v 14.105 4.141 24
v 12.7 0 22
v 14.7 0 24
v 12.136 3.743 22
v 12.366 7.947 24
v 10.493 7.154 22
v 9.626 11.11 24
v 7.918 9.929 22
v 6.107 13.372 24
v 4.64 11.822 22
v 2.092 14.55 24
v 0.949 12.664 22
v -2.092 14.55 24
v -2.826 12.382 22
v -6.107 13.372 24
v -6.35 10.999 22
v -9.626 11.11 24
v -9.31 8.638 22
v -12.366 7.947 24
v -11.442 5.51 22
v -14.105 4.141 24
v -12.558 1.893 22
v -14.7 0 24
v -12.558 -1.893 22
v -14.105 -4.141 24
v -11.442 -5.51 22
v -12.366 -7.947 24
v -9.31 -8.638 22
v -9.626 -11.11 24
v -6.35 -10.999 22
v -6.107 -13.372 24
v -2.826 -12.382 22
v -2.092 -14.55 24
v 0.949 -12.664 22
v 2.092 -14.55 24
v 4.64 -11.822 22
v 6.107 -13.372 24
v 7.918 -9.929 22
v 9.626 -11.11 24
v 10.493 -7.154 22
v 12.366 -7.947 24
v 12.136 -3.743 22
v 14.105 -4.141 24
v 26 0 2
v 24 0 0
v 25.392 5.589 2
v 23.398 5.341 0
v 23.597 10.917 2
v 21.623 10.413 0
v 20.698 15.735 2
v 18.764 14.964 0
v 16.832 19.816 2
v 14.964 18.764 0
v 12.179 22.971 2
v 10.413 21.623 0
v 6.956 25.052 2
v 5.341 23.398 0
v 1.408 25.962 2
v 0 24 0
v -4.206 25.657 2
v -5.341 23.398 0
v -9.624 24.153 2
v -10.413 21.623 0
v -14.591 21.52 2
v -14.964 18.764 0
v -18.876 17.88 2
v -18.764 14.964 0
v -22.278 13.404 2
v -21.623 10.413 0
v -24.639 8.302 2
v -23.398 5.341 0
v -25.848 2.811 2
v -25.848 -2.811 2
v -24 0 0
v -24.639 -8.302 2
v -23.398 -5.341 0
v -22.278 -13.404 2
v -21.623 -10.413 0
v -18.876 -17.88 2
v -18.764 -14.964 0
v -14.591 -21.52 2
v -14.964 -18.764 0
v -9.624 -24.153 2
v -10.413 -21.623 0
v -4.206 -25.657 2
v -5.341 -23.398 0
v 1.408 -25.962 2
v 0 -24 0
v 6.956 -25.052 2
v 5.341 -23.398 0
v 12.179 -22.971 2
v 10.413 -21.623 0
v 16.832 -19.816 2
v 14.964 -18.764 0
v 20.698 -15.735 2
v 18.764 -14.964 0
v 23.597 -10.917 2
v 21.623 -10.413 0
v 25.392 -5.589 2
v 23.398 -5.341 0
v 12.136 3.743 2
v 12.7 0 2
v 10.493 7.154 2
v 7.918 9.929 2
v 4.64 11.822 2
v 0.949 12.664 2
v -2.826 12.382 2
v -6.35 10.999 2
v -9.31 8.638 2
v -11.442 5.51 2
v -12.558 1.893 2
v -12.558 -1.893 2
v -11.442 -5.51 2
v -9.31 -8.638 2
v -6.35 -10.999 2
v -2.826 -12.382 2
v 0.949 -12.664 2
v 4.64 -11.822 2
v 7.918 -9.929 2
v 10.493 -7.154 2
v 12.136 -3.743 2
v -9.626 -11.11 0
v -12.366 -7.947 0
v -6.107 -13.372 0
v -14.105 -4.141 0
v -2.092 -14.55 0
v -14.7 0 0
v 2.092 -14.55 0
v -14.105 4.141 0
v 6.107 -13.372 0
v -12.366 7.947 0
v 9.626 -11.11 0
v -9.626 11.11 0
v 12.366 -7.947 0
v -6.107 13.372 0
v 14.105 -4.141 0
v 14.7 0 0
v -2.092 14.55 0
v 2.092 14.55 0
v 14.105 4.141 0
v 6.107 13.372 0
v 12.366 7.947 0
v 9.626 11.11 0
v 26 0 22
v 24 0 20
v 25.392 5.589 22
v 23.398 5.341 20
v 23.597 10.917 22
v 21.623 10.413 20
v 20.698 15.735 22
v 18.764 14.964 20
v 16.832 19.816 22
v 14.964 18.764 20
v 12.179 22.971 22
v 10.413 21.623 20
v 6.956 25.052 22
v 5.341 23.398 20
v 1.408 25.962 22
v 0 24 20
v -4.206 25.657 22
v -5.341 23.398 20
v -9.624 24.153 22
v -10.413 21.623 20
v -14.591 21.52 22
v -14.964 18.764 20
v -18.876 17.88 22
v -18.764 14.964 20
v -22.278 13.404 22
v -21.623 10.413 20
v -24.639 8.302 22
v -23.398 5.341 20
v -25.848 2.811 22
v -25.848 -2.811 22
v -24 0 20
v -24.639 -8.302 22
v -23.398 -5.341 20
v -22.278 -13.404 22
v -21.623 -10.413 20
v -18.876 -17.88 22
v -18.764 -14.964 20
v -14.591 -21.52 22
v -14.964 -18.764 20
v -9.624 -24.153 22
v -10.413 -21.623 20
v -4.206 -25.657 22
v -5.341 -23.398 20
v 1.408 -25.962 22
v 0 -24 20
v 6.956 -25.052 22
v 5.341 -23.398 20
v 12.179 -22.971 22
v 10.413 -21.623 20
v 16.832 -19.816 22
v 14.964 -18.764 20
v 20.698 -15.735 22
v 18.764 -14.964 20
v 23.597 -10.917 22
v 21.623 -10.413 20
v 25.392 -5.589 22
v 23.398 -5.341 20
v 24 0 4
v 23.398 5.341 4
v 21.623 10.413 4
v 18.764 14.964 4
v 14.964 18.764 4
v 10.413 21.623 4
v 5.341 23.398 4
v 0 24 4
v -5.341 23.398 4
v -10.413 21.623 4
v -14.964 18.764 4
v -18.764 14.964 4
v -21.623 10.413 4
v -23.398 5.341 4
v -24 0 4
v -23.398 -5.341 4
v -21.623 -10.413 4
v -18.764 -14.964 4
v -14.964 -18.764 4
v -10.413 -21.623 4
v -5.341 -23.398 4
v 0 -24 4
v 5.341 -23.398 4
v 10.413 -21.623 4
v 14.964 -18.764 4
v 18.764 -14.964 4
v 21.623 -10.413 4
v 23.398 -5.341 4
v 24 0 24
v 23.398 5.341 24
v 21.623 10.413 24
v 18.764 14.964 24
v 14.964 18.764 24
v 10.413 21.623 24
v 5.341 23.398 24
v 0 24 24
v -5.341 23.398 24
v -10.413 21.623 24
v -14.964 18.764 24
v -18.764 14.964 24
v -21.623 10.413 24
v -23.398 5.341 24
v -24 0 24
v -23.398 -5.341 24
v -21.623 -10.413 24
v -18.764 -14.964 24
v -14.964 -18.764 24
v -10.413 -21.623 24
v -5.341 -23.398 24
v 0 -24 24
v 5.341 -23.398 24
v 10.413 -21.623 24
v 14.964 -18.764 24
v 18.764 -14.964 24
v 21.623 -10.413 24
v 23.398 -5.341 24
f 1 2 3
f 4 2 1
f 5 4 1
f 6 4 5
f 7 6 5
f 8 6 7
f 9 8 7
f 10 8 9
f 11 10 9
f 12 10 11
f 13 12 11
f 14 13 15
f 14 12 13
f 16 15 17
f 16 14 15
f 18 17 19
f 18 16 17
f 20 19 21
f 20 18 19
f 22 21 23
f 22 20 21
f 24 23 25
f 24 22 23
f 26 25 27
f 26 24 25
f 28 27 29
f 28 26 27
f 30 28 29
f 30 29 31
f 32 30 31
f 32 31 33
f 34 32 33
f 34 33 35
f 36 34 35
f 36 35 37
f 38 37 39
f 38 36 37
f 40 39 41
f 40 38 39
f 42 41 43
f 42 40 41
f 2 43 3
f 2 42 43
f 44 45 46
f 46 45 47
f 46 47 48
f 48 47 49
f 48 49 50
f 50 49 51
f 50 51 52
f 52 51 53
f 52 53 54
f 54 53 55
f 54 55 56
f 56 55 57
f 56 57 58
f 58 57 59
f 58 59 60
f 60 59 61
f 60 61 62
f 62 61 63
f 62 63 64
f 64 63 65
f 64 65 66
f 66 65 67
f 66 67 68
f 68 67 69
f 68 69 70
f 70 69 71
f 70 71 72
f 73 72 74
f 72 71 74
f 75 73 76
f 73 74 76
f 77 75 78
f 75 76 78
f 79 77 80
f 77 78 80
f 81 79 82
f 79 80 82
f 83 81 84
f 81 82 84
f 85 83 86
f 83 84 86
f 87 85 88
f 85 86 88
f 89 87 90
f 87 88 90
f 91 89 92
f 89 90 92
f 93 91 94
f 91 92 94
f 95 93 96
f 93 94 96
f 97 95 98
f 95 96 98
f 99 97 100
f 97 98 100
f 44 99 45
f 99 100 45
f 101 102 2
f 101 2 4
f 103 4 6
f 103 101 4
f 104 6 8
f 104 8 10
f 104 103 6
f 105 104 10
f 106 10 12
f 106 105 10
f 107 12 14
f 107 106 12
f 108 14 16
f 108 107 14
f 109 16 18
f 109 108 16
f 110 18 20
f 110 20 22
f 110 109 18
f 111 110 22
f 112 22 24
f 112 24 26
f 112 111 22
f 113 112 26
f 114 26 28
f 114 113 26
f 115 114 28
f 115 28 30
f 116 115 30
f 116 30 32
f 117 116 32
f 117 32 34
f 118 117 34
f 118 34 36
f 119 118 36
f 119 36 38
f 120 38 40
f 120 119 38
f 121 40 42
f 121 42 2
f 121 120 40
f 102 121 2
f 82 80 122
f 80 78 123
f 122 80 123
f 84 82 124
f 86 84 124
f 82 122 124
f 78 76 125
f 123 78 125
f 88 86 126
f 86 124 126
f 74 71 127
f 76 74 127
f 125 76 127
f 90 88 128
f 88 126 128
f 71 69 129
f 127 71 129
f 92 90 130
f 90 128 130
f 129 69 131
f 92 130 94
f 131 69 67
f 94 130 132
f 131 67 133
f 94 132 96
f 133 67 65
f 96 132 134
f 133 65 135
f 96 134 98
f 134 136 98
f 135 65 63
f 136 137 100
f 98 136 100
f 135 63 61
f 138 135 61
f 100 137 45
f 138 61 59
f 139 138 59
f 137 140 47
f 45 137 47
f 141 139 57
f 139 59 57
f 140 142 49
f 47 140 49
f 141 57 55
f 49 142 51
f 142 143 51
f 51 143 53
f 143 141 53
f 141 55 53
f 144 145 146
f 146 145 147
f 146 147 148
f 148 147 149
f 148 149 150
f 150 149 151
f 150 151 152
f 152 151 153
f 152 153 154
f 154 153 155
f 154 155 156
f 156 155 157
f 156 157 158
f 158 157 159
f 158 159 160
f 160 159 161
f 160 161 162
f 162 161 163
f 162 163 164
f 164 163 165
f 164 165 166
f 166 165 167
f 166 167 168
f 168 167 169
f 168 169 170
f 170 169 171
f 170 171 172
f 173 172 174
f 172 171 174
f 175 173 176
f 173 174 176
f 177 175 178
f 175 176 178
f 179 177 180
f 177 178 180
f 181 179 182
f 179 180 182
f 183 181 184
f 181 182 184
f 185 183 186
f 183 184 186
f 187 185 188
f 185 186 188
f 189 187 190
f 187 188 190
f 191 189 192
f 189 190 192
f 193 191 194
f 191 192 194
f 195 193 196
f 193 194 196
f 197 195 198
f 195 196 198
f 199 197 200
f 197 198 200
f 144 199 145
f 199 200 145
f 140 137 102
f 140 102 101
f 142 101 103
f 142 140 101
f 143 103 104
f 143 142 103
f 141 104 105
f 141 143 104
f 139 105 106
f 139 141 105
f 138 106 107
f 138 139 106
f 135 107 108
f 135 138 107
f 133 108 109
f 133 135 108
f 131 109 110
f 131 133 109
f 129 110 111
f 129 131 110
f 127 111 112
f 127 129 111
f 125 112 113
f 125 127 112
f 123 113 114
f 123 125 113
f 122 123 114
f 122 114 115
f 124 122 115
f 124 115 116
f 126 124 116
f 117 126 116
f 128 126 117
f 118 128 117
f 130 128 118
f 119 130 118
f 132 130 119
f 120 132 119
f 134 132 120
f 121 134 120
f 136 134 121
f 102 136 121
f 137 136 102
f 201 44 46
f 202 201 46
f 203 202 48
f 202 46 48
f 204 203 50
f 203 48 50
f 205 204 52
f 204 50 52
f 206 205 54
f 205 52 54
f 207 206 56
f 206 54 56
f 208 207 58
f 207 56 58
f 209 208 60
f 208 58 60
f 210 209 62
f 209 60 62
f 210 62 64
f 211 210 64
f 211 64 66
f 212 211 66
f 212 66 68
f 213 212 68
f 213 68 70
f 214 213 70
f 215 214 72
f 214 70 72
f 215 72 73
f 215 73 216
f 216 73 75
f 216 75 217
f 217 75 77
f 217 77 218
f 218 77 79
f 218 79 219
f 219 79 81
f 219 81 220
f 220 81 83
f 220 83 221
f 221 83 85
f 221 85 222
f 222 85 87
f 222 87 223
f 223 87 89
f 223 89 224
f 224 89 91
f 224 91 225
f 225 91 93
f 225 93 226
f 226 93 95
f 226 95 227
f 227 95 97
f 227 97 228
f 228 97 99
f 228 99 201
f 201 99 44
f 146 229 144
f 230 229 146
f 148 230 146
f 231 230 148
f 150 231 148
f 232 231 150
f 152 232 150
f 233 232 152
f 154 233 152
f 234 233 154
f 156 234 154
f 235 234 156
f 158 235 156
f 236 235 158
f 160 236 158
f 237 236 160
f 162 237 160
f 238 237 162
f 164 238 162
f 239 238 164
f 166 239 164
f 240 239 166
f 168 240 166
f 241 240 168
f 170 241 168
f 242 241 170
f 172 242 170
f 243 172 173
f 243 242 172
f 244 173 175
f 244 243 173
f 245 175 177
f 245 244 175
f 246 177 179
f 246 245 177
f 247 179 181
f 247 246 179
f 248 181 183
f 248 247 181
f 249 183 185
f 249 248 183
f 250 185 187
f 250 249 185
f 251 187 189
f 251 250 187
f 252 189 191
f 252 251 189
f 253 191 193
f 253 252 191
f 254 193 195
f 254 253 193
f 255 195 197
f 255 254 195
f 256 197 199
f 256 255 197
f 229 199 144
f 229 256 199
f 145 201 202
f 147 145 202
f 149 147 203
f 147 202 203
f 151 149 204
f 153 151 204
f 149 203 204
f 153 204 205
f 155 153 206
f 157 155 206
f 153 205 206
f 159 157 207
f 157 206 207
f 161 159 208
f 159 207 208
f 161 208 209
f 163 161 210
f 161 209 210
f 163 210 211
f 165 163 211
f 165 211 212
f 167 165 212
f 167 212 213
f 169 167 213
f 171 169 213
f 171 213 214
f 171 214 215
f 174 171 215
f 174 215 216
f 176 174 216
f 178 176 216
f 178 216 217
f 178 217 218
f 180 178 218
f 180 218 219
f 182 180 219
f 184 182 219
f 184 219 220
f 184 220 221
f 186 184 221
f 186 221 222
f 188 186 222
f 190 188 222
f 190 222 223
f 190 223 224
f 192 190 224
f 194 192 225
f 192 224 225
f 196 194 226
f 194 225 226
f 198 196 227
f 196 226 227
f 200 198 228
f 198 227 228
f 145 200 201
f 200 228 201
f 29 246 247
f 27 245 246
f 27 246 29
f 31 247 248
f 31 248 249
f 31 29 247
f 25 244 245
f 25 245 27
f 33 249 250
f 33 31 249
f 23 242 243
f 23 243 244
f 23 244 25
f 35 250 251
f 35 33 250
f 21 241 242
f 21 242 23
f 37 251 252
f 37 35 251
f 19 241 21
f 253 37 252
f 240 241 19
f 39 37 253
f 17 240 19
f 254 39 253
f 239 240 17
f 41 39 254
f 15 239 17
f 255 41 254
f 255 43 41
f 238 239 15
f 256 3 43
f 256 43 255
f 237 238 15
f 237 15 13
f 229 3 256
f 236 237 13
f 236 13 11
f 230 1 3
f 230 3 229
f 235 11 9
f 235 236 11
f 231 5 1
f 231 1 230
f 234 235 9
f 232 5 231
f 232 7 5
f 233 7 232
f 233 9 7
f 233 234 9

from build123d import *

# Parameters (mm, degrees)
F0_R     = 24
F0_R_2   = 12.7
F1_DEPTH = 24
F0_R_3   = 26
F2_DEPTH = 4
F3_START = 20
F3_DEPTH = 4
F4_SIZE  = 1.99999


# Not quite as in the source:
# - a fillet or chamfer is up to 0.001 mm smaller than in the source, because OpenCascade refuses the exact size


with BuildPart() as f1:
    # F0 (on Top) → F1 (new body)
    with BuildSketch(Plane.XY):
        Circle(F0_R)
        Circle(F0_R_2, mode=Mode.SUBTRACT)
    extrude(amount=F1_DEPTH)

    # F0 (on Top) → F2 (join)
    with BuildSketch(Plane.XY):
        Circle(F0_R_3)
        Circle(F0_R, mode=Mode.SUBTRACT)
    extrude(amount=F2_DEPTH)

    # F0 (on Top) → F3 (join)
    with BuildSketch(Plane.XY.offset(F3_START)):
        Circle(F0_R_3)
        Circle(F0_R, mode=Mode.SUBTRACT)
    extrude(amount=F3_DEPTH)

    # F4 (size 2 in the source; OpenCascade refuses exactly that, so slightly less here)
    f4_edges = [f1.edges().sort_by_distance(p)[0] for p in [
        (-26, 0, 20),
        (-26, 0, 24),
        (-26, 0, 4),
        (-26, 0, 0),
        (-12.7, 0, 0),
        (12.7, 0, 12),
        (-12.7, 0, 24),
    ]]
    chamfer(f4_edges, length=F4_SIZE)


solid = f1.part
